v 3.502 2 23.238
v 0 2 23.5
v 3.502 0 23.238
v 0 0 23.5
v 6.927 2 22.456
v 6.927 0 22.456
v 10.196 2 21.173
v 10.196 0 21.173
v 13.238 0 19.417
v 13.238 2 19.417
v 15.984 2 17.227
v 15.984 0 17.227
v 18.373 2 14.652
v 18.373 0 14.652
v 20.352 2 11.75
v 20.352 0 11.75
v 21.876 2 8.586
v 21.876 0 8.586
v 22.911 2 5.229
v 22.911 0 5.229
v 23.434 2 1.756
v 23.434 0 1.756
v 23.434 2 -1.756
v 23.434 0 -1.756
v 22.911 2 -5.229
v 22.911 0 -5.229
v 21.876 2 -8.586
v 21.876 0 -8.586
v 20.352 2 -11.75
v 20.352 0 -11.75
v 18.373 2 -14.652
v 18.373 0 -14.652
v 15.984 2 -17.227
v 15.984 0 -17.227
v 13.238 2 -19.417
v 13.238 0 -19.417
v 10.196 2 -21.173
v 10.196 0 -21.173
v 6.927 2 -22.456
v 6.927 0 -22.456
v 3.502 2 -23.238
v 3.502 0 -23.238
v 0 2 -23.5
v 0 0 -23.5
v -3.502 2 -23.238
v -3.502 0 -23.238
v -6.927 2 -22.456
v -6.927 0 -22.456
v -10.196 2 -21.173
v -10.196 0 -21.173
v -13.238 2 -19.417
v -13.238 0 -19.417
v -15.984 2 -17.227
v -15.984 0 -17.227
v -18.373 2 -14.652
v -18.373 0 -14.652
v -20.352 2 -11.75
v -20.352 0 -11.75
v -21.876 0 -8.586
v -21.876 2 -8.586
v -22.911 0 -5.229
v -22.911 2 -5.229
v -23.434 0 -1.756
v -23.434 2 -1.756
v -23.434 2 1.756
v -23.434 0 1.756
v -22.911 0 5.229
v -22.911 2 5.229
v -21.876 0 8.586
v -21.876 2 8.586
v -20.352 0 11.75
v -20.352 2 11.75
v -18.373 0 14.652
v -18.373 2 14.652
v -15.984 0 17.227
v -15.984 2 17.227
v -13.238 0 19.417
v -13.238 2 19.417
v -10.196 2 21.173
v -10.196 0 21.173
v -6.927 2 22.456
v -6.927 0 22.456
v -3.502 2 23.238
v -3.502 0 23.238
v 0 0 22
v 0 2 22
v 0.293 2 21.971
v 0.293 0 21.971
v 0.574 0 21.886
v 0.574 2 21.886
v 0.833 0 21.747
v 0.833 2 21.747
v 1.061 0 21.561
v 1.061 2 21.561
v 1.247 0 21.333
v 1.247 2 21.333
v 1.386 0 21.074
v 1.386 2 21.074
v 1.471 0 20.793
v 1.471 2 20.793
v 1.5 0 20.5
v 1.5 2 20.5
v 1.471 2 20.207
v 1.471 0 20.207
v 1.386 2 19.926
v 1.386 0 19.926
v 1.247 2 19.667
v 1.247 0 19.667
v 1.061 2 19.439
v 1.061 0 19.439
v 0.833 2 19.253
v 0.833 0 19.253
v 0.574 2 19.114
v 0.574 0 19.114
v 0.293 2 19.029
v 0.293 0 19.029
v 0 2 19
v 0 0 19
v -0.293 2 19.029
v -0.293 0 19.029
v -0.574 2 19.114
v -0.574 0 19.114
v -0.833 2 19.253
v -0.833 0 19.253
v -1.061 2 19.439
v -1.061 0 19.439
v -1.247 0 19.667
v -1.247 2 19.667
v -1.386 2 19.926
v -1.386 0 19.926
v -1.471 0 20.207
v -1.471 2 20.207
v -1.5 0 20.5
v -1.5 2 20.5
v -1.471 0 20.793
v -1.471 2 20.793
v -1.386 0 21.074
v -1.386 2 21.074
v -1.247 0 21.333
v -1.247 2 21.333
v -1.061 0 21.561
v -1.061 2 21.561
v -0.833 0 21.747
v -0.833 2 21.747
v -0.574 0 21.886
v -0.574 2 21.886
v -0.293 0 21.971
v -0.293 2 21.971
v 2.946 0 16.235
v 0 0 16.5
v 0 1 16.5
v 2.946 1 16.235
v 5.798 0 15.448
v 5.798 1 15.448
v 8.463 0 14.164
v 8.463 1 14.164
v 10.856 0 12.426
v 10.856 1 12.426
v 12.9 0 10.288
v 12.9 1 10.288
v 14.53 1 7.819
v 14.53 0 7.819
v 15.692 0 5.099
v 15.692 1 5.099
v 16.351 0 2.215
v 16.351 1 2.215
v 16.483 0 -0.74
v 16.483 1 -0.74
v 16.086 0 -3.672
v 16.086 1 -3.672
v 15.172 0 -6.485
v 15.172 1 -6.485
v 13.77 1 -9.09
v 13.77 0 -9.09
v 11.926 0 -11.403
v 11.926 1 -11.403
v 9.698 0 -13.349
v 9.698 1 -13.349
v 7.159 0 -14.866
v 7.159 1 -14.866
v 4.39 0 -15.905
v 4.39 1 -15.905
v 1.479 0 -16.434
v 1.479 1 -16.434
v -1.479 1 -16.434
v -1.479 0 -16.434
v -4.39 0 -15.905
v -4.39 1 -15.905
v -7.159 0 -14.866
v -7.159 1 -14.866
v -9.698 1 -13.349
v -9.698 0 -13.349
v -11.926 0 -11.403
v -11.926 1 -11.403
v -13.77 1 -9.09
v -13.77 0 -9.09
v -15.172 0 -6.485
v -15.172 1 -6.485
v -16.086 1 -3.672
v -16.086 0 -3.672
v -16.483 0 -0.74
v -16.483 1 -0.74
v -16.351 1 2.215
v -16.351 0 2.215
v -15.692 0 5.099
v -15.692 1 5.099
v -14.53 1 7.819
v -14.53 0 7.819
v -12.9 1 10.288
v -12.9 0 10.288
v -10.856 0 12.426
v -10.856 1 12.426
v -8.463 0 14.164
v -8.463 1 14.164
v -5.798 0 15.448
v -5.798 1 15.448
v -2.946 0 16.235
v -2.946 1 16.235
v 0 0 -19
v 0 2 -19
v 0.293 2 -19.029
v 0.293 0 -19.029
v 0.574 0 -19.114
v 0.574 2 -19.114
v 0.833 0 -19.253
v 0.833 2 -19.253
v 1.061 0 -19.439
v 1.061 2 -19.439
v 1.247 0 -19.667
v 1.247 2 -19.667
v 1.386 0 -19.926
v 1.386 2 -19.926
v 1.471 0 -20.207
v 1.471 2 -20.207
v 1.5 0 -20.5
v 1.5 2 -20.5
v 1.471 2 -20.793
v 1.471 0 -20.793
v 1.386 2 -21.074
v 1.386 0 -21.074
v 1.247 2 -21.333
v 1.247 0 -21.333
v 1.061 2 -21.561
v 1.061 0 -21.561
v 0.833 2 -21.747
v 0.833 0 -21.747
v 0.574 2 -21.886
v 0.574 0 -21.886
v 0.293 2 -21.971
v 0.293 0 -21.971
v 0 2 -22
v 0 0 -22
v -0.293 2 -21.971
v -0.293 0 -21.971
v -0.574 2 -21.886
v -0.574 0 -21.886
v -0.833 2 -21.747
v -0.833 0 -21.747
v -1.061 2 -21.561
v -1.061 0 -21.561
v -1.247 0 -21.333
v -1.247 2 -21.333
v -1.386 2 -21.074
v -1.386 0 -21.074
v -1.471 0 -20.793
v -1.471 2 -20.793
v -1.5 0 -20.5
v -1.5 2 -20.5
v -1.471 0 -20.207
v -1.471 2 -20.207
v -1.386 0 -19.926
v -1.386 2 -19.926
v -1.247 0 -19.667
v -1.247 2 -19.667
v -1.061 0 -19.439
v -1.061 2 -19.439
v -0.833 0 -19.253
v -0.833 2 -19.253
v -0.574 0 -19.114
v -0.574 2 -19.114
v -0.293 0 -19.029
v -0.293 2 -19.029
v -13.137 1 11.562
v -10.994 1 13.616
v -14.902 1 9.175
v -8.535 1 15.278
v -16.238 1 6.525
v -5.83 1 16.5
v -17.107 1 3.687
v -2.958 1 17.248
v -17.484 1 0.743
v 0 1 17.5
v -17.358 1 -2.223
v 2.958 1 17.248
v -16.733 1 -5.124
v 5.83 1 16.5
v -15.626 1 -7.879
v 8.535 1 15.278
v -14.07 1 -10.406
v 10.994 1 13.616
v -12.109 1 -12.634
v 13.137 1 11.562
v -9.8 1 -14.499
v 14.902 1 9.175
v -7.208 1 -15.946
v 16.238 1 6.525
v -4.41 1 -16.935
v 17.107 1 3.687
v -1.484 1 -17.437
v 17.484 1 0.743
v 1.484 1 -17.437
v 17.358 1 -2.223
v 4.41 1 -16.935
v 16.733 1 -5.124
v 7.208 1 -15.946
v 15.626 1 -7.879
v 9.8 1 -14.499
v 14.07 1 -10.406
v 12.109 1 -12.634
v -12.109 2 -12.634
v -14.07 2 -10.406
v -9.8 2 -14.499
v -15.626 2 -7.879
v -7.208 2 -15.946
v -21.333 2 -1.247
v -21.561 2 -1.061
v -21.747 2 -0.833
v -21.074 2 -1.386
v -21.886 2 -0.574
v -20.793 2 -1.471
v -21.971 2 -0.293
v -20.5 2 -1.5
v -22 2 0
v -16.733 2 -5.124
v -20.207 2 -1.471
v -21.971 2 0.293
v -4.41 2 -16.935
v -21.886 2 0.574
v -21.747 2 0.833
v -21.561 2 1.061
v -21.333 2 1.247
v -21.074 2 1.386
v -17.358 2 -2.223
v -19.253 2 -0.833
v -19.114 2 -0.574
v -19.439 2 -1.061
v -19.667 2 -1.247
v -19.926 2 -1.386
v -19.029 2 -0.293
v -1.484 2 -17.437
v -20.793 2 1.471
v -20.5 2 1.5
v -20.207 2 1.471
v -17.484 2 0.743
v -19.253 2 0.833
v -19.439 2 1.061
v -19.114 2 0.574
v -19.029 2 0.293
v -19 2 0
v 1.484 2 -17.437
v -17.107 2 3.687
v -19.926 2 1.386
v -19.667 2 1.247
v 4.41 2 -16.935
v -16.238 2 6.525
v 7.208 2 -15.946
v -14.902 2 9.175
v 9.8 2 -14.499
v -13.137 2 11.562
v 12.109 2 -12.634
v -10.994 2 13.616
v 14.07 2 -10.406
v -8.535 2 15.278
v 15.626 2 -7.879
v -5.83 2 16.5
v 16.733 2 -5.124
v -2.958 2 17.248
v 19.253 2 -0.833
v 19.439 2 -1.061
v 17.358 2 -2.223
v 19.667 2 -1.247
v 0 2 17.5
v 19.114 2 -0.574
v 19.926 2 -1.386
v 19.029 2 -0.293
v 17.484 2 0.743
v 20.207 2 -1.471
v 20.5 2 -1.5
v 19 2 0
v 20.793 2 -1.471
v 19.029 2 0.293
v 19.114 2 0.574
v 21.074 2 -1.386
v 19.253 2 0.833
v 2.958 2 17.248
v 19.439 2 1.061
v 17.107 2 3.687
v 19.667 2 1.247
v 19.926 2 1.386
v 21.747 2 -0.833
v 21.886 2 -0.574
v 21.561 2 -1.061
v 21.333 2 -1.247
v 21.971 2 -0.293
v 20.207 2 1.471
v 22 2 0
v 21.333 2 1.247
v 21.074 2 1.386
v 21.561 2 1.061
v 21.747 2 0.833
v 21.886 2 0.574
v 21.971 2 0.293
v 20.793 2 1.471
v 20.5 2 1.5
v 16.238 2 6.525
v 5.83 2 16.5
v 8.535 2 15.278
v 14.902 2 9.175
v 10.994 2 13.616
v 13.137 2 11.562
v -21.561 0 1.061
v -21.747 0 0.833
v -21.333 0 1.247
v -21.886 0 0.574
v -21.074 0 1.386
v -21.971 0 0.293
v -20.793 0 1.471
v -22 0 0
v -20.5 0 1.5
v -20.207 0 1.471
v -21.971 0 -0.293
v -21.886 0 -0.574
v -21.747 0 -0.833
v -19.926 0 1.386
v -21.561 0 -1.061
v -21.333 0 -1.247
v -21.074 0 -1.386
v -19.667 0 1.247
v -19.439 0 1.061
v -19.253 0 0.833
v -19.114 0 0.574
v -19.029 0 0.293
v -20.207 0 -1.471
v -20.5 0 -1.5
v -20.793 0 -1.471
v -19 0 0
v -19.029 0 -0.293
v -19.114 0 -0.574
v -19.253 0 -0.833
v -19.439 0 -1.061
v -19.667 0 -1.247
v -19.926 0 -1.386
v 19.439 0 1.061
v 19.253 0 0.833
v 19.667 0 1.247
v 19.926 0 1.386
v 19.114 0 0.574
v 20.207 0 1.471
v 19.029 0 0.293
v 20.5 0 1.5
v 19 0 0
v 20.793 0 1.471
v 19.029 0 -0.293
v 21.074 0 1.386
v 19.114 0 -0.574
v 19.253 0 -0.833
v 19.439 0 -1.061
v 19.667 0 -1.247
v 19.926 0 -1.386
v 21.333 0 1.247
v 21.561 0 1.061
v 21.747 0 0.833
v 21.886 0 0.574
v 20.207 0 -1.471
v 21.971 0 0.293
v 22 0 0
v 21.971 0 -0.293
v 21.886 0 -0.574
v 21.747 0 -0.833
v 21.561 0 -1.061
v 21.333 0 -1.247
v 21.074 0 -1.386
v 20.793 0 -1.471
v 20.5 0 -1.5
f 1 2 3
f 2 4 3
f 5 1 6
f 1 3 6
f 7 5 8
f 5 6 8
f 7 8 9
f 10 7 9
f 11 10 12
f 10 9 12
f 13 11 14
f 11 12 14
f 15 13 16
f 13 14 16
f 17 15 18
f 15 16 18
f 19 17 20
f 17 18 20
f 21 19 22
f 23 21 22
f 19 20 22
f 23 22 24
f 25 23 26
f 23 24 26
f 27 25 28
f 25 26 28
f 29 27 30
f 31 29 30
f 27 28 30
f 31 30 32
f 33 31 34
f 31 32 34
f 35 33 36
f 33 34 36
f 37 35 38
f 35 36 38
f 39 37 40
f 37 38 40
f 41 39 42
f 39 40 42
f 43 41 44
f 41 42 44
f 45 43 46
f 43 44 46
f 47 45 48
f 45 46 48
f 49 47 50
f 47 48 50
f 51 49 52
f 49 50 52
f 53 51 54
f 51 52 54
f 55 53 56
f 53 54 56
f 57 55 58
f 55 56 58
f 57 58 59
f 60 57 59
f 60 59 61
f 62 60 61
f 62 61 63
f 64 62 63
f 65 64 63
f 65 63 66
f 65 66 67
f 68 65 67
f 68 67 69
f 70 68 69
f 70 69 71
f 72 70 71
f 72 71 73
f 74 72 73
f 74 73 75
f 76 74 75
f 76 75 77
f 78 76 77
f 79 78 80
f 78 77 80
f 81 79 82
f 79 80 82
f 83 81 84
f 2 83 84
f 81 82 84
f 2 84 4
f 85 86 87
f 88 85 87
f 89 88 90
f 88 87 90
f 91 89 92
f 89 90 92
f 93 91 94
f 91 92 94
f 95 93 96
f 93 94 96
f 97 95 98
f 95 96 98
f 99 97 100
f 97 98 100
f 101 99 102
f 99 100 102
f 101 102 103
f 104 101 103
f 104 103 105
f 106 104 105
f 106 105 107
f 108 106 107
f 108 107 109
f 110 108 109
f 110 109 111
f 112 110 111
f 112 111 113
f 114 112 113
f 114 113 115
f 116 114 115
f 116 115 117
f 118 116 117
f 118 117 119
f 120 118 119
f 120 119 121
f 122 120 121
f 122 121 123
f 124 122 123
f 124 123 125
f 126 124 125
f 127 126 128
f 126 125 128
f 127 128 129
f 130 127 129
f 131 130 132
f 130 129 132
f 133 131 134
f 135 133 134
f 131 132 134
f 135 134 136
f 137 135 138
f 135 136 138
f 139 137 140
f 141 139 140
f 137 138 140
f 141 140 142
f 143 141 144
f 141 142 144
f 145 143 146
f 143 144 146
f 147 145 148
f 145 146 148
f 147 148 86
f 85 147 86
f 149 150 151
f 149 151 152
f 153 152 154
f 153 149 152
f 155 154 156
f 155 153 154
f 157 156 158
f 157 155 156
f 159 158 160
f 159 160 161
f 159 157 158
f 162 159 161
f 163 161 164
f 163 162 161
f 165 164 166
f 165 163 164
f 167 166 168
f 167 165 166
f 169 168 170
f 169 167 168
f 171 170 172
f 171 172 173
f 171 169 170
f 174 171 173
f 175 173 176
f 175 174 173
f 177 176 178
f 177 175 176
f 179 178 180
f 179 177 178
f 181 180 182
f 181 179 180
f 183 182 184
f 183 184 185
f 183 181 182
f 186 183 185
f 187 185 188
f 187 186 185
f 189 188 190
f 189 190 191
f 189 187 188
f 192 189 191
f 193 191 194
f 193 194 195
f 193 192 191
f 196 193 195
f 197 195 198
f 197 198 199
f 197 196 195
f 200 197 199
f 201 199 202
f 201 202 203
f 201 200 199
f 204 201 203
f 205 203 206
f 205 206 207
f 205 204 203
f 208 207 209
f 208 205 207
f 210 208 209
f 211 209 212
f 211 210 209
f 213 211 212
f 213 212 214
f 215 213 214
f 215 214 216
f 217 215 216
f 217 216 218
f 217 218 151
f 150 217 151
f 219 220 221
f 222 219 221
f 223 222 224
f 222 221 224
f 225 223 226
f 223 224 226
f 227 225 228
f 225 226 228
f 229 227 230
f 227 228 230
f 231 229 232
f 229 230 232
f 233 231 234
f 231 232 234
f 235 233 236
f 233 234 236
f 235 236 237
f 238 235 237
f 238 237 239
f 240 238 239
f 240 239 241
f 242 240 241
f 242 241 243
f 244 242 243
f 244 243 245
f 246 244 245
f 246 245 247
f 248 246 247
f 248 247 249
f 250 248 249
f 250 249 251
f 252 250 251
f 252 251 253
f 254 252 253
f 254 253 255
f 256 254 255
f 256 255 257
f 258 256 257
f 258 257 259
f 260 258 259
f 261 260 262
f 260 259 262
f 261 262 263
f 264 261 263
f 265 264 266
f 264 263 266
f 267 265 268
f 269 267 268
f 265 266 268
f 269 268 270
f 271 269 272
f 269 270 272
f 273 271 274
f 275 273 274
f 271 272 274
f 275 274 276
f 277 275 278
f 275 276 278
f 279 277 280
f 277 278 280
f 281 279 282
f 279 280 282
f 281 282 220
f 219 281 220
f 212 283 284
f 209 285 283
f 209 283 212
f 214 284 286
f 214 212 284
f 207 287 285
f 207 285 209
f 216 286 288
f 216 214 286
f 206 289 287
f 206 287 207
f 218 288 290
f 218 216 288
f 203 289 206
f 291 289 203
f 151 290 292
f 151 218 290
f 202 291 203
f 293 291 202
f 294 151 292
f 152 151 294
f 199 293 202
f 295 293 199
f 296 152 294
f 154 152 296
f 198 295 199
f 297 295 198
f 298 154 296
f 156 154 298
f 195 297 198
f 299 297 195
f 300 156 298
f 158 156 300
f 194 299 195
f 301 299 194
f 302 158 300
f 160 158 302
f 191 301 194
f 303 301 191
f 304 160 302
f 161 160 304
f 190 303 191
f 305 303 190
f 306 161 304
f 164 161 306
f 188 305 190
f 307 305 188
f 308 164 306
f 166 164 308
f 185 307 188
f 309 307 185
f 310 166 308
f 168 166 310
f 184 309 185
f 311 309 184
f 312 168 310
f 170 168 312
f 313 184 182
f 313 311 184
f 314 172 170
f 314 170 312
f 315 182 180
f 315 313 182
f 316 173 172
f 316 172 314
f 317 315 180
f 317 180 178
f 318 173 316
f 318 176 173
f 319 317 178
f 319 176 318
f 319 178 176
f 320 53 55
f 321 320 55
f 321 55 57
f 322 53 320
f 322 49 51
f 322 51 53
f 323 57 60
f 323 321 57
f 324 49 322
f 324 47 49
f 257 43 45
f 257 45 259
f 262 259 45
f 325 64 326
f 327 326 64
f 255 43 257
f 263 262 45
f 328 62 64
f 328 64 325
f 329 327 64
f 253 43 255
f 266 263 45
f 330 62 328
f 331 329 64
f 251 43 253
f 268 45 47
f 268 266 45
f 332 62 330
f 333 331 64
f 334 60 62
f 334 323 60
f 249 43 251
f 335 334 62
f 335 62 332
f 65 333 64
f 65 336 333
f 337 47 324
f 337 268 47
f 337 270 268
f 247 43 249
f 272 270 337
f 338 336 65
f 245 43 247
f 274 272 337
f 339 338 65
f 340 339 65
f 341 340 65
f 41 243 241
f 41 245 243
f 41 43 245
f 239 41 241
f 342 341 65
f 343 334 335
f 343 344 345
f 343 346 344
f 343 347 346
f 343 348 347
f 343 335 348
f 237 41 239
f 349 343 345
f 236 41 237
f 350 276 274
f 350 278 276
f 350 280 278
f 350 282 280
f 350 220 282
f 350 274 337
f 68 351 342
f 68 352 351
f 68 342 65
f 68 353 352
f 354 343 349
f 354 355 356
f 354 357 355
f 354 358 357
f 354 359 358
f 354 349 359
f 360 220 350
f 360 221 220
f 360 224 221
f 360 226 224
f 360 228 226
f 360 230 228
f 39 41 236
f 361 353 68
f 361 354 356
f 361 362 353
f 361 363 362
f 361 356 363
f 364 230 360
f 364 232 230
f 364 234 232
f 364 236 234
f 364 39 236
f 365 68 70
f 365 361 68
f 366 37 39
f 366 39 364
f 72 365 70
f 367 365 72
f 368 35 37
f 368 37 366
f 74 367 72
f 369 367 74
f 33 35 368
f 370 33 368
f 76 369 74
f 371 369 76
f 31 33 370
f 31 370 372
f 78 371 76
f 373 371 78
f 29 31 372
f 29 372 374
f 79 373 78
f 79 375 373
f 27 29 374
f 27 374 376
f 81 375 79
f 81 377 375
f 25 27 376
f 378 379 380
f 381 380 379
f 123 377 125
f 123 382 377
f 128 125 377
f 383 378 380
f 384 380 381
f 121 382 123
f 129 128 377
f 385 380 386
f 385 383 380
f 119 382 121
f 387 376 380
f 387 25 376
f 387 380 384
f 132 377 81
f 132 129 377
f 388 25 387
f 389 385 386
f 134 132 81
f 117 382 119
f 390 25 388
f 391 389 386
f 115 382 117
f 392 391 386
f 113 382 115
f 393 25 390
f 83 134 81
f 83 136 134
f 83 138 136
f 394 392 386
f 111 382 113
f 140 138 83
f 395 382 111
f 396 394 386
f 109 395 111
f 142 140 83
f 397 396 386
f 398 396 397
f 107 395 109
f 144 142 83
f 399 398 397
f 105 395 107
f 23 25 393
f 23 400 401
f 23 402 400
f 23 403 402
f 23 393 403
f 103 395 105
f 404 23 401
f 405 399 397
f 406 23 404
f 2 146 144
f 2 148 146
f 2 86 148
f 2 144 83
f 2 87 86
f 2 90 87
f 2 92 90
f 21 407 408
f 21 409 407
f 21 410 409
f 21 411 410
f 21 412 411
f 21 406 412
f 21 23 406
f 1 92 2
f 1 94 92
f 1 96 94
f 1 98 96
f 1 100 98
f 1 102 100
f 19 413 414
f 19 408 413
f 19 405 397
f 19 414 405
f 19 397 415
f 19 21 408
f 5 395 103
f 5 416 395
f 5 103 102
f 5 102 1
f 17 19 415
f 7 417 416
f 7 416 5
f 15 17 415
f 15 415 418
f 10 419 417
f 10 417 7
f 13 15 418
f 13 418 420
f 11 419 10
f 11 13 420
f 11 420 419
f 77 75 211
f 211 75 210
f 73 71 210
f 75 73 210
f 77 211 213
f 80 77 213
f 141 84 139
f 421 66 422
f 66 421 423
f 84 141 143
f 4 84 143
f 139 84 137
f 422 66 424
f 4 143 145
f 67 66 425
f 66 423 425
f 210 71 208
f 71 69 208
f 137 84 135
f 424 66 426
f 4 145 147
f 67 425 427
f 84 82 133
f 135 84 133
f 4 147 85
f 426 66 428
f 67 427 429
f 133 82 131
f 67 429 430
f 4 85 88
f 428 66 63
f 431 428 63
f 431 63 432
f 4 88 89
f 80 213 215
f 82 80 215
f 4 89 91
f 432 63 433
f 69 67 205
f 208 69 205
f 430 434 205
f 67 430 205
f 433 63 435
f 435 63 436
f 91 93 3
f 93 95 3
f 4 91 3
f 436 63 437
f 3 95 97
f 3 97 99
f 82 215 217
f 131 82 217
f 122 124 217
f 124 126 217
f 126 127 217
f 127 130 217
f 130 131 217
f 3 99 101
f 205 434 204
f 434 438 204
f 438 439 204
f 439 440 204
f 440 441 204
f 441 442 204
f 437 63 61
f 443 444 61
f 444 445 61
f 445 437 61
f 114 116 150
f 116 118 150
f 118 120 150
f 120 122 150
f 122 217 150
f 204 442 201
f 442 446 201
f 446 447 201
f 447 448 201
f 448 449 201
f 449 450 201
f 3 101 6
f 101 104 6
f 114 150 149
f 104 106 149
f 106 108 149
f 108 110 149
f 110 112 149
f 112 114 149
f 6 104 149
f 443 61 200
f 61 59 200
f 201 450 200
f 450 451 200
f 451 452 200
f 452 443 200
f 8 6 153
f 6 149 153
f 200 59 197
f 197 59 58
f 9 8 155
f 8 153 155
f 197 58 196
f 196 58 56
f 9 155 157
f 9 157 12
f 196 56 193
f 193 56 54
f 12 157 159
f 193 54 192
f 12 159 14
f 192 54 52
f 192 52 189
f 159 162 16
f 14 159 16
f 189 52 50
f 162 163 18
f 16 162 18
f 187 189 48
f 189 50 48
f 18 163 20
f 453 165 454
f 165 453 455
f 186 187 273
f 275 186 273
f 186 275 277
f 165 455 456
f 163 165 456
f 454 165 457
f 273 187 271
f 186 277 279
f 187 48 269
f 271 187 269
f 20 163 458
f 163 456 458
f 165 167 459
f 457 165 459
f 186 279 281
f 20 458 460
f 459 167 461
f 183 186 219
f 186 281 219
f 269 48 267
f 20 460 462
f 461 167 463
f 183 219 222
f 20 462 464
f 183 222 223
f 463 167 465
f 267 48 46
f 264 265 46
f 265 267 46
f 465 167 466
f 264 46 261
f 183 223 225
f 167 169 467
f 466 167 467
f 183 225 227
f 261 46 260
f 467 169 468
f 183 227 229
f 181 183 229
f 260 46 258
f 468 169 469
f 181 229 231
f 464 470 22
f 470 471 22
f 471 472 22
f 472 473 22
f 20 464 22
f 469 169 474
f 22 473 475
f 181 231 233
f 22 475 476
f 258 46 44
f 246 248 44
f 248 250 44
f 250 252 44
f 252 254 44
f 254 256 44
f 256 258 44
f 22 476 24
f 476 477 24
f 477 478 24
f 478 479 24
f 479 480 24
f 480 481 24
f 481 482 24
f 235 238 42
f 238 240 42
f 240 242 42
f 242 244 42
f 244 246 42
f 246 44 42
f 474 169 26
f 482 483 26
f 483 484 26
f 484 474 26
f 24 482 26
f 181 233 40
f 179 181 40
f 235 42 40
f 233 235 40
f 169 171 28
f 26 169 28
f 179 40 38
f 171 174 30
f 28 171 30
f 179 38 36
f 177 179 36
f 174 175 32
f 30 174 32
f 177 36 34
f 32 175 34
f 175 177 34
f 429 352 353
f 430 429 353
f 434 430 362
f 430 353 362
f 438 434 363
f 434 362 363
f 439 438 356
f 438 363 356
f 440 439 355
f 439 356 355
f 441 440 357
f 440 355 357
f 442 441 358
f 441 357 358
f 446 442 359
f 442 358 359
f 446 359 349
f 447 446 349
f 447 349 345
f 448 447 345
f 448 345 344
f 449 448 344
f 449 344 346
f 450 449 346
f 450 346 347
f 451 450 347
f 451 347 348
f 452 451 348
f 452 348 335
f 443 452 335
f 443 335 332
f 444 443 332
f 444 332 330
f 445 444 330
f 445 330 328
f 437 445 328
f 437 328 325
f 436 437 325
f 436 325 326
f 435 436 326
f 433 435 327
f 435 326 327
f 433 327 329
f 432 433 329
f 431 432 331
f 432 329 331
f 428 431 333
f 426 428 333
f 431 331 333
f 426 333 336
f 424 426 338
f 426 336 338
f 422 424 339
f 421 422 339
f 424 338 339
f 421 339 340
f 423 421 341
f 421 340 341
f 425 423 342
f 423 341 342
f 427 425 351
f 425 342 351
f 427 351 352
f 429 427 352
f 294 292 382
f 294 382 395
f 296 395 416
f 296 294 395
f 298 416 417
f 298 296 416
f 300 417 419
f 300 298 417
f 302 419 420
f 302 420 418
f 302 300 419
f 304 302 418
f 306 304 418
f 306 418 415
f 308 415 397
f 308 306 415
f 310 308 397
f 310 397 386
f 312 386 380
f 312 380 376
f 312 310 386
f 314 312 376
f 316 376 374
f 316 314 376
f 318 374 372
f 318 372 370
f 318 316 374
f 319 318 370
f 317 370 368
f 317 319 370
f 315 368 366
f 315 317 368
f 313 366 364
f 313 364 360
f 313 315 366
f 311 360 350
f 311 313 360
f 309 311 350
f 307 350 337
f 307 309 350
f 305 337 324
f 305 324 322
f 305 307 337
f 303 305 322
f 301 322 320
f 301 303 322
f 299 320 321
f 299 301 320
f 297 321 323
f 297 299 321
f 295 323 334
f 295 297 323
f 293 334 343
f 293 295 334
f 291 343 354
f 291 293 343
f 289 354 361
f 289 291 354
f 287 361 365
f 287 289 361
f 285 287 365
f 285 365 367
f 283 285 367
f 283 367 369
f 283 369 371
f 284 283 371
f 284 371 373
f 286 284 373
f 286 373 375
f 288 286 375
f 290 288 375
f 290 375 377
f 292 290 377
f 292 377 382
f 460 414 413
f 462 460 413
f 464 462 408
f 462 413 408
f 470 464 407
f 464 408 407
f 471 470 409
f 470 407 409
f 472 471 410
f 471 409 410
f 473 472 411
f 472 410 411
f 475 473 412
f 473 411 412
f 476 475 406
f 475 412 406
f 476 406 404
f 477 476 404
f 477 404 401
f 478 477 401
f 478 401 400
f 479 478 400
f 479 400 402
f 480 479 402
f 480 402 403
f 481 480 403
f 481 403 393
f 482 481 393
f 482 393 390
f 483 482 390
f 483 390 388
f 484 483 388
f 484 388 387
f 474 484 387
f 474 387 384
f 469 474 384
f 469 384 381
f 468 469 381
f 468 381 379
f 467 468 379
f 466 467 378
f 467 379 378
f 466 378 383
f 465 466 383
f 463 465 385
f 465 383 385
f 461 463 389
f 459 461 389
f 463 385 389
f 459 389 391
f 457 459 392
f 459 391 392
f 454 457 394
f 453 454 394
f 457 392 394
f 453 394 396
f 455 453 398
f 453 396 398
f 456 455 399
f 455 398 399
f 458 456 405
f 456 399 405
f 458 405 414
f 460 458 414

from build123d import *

# Parameters (mm, degrees)
SKETCH_1_R          = 23.5
SKETCH_1_R_2        = 17.5
SKETCH_1_R_3        = 16.5
EXTRUDE_1_DEPTH     = 1
SKETCH_2_R          = 23.5
SKETCH_2_R_2        = 17.5
EXTRUDE_2_DEPTH     = 1
SKETCH_3_R          = 1.5
CUT_EXTRUDE_1_DEPTH = 11


with BuildPart() as part:
    # 草图1 → 凸台-拉伸1 (new body)
    # profile 1 of 2: a face of its own
    with BuildSketch(Plane(origin=(0, 0, 0), x_dir=(1, 0, 0), z_dir=(0, 1, 0))):
        with Locations(Location((0, 0, 0), (0, 0, 270))):
            Circle(SKETCH_1_R)
        Circle(SKETCH_1_R_2, mode=Mode.SUBTRACT)
    # profile 2 of 2: a face of its own
    with BuildSketch(Plane(origin=(0, 0, 0), x_dir=(1, 0, 0), z_dir=(0, 1, 0))):
        Circle(SKETCH_1_R_2)
        with Locations(Location((0, 0, 0), (0, 0, 270))):
            Circle(SKETCH_1_R_3, mode=Mode.SUBTRACT)
    extrude(amount=EXTRUDE_1_DEPTH)

    # 草图2 → 凸台-拉伸2 (add)
    with BuildSketch(Plane(origin=(0, 1, 0), x_dir=(1, 0, 0), z_dir=(0, 1, 0))):
        with Locations(Location((0, 0, 0), (0, 0, 270))):
            Circle(SKETCH_2_R)
        with Locations(Location((0, 0, 0), (0, 0, 270))):
            Circle(SKETCH_2_R_2, mode=Mode.SUBTRACT)
    extrude(amount=EXTRUDE_2_DEPTH)

    # 草图3 → 切除-拉伸1 (cut)
    with BuildSketch(Plane(origin=(0, 2, 0), x_dir=(1, 0, 0), z_dir=(0, 1, 0))):
        with Locations(Location((0, 20.5, 0), (0, 0, 270))):
            Circle(SKETCH_3_R)
        with Locations(Location((20.5, 0, 0), (0, 0, 270))):
            Circle(SKETCH_3_R)
        with Locations(Location((0, -20.5, 0), (0, 0, 270))):
            Circle(SKETCH_3_R)
        with Locations(Location((-20.5, 0, 0), (0, 0, 270))):
            Circle(SKETCH_3_R)
    extrude(amount=-CUT_EXTRUDE_1_DEPTH, mode=Mode.SUBTRACT)


solid = part.part
